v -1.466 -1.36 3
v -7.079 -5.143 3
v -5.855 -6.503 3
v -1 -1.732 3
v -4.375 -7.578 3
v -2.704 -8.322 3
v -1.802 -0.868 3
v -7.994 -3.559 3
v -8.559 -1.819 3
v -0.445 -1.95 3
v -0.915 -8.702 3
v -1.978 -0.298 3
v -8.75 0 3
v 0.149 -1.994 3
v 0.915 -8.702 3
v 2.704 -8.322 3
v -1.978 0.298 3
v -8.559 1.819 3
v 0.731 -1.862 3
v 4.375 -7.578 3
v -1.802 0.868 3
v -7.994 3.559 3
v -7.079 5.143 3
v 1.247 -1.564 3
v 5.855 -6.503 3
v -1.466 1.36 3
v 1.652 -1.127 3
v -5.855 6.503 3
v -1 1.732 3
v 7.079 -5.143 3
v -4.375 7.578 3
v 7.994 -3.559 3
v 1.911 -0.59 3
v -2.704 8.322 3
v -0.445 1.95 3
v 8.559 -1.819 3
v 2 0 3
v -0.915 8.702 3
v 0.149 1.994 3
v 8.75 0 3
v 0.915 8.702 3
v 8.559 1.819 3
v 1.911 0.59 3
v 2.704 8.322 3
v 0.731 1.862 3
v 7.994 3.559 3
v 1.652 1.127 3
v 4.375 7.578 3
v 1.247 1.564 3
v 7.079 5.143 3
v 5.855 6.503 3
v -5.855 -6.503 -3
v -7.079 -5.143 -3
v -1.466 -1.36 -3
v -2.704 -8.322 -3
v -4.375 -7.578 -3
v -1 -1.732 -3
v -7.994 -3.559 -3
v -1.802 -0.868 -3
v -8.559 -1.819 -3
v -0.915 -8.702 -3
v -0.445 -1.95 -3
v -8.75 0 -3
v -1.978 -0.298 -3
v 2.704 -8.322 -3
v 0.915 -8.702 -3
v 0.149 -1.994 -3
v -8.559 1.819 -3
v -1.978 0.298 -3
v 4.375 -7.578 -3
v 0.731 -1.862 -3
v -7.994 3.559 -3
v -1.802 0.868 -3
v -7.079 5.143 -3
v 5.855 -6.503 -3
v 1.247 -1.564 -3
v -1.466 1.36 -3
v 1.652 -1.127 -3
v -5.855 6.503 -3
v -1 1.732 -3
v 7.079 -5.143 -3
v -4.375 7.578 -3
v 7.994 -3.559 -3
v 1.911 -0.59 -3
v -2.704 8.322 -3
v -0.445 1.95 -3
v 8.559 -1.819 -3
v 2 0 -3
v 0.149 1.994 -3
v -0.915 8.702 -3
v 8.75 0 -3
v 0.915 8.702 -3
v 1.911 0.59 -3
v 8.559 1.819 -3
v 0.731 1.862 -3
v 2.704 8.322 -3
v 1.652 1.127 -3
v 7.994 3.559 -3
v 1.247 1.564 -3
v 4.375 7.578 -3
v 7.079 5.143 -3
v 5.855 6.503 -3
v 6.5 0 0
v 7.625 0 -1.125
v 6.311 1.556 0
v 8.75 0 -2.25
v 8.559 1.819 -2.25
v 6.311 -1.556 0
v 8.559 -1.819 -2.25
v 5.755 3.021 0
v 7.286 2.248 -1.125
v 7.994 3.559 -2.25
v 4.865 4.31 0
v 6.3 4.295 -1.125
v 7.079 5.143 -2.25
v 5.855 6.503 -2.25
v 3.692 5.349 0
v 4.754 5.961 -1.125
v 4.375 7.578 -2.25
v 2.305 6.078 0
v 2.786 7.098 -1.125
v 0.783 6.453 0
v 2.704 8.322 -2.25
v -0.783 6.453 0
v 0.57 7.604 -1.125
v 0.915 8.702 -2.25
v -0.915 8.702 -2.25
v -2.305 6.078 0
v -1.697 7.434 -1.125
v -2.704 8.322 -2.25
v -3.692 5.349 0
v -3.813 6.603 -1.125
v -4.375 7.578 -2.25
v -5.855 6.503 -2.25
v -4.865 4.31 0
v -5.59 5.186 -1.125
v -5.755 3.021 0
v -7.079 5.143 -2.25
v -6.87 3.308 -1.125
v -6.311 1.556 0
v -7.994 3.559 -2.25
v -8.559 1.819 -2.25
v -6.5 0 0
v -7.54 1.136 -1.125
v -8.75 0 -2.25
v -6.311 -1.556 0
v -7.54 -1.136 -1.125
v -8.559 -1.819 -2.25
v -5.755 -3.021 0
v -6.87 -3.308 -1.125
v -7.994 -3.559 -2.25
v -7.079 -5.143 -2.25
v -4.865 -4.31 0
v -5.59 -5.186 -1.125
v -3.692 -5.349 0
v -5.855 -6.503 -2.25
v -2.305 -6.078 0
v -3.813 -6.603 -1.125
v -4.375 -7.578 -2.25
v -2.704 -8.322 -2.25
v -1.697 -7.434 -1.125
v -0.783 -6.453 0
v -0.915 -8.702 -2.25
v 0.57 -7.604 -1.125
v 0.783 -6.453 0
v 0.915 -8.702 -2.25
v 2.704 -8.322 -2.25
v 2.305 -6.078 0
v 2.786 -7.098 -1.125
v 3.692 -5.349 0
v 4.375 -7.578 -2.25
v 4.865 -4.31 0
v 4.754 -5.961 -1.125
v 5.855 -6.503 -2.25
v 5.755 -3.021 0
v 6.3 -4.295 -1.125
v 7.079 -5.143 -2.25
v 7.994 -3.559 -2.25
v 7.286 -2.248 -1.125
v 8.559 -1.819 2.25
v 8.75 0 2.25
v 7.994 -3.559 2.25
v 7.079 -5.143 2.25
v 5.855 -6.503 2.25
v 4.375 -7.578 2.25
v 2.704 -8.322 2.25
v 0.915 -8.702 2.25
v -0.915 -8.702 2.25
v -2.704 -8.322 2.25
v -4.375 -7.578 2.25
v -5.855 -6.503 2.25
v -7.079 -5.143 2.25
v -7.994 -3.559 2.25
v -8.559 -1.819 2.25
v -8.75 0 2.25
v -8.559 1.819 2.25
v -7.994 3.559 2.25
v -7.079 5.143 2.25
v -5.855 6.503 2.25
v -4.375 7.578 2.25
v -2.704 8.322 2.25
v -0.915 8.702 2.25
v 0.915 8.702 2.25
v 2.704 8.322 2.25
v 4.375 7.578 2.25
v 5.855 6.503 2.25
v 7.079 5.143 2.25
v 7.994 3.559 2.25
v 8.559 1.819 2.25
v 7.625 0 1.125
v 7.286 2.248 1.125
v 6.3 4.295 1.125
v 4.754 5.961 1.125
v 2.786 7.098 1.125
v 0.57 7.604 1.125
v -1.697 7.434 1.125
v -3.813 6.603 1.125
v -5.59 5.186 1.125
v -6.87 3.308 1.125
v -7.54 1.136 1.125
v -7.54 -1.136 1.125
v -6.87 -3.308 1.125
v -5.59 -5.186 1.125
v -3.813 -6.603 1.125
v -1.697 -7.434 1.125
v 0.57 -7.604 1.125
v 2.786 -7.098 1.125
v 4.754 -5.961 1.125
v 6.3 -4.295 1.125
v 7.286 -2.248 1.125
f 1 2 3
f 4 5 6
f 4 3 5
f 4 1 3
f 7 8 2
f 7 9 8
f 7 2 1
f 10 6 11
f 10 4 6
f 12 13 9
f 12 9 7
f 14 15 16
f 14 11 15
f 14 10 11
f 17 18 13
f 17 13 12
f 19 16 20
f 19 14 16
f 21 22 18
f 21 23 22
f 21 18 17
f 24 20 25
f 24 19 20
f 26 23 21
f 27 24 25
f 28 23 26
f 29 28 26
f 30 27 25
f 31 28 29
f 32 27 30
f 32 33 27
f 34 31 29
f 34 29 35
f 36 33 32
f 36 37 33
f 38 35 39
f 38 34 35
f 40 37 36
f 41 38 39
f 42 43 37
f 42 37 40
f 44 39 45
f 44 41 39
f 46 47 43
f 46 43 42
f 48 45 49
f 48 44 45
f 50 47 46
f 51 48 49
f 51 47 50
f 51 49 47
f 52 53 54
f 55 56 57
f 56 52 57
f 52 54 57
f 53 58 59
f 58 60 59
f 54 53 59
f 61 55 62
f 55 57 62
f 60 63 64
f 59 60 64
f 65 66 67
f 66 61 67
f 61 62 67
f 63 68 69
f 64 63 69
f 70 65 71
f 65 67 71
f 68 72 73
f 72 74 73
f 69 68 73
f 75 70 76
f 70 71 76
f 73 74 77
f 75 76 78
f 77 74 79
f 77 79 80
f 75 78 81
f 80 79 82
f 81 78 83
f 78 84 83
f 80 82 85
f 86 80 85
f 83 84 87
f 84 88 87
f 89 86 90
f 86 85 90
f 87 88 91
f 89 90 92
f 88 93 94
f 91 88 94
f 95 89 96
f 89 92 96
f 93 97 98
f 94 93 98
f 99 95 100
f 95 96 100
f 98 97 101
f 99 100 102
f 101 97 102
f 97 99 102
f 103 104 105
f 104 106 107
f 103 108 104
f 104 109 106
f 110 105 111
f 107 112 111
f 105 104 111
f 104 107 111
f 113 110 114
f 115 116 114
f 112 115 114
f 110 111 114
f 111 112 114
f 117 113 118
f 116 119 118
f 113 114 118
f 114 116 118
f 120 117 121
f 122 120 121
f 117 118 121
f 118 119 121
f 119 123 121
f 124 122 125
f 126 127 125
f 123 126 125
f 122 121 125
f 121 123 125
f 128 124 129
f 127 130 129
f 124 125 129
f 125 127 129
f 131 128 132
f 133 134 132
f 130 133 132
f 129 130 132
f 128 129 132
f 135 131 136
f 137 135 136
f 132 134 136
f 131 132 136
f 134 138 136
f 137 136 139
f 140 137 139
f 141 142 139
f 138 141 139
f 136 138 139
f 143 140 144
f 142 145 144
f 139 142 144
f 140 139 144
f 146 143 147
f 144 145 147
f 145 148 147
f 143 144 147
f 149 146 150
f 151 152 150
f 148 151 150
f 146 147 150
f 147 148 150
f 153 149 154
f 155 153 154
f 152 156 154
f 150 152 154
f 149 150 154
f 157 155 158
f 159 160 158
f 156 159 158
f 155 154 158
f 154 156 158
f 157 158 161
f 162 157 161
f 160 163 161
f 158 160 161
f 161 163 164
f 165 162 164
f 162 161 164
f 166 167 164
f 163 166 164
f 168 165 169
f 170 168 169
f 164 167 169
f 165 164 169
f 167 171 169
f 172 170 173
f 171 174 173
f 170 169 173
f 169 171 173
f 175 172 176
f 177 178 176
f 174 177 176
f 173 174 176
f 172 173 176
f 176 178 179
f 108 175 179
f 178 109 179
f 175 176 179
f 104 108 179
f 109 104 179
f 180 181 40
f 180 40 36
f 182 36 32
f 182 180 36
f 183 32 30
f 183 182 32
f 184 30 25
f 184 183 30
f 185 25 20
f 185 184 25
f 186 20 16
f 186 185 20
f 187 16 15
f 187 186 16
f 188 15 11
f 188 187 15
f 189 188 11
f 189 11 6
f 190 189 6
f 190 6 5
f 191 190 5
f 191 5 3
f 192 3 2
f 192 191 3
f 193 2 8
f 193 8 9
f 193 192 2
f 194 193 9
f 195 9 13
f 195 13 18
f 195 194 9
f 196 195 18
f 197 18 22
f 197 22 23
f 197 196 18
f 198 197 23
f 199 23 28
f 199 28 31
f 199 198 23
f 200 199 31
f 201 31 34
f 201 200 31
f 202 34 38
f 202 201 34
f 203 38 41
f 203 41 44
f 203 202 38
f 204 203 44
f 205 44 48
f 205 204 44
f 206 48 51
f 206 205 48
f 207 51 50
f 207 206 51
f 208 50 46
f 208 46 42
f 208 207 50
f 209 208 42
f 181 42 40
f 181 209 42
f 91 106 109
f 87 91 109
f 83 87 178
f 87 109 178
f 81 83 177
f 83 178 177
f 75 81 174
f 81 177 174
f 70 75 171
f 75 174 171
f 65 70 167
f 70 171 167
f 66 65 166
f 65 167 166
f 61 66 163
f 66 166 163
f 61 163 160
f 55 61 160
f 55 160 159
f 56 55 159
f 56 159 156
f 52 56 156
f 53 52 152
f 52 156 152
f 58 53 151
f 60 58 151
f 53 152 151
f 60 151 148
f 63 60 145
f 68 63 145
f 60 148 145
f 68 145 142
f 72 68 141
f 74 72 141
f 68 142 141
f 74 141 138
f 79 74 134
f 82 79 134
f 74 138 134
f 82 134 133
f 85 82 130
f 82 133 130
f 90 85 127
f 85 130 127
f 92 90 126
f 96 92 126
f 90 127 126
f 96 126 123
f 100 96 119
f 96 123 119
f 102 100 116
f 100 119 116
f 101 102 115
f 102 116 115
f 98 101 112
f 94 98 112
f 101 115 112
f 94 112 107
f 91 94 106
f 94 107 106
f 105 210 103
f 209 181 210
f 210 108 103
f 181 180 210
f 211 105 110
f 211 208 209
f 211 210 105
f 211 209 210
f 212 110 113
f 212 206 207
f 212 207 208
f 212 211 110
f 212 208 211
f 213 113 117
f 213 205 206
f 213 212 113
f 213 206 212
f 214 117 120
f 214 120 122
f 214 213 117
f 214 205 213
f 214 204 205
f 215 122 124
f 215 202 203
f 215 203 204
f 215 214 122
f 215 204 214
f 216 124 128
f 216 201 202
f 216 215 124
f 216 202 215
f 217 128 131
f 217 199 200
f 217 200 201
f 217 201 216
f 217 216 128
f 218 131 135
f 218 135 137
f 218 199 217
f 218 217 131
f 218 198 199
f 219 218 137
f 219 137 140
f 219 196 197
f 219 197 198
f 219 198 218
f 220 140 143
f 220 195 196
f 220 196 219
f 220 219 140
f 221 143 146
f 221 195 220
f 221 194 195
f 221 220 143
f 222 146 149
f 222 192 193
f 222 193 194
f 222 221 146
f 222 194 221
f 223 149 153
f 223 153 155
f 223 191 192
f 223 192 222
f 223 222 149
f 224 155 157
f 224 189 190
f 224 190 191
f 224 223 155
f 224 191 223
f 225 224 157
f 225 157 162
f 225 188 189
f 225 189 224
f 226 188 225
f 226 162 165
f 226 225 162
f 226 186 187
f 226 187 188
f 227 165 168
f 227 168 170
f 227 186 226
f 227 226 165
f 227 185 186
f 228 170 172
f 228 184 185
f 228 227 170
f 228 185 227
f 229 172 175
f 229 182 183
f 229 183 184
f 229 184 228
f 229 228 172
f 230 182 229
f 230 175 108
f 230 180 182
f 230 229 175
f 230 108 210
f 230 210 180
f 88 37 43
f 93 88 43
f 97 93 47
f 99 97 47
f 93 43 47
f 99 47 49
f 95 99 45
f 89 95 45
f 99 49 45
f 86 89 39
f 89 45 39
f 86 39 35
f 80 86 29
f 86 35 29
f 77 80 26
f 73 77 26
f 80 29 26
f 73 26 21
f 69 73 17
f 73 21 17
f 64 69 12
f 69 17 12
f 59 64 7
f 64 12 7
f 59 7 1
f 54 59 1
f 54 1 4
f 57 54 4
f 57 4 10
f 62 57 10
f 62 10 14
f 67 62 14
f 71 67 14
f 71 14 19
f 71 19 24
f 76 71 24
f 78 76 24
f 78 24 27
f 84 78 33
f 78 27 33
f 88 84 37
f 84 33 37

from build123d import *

# Parameters (mm, degrees)
F0_R     = 6.5
F1_DEPTH = 2.25
F1_TAPER = -45
F2_DEPTH = 0.75
F4_R     = 2
F5_DEPTH = 6


with BuildPart() as f1:
    # F0 (on Top) → F1 (new body)
    with BuildSketch(Plane.XY):
        Circle(F0_R)
    extrude(amount=F1_DEPTH, taper=F1_TAPER)

    # F2 (add): a face of the model
    f2_faces = [f1.faces().sort_by_distance(p)[0] for p in [
        (0, 0, 2.25),
    ]]
    extrude(f2_faces, amount=F2_DEPTH)

    # F3: F1 across plane


with BuildPart() as f1_1:
    add(f1.part)
    add(f1.part.mirror(Plane.XY))

    # F4 (on face) → F5 (cut, through all)
    with BuildSketch(Plane.XY.offset(3)):
        Circle(F4_R)
    extrude(amount=-F5_DEPTH, mode=Mode.SUBTRACT)


solid = f1_1.part
